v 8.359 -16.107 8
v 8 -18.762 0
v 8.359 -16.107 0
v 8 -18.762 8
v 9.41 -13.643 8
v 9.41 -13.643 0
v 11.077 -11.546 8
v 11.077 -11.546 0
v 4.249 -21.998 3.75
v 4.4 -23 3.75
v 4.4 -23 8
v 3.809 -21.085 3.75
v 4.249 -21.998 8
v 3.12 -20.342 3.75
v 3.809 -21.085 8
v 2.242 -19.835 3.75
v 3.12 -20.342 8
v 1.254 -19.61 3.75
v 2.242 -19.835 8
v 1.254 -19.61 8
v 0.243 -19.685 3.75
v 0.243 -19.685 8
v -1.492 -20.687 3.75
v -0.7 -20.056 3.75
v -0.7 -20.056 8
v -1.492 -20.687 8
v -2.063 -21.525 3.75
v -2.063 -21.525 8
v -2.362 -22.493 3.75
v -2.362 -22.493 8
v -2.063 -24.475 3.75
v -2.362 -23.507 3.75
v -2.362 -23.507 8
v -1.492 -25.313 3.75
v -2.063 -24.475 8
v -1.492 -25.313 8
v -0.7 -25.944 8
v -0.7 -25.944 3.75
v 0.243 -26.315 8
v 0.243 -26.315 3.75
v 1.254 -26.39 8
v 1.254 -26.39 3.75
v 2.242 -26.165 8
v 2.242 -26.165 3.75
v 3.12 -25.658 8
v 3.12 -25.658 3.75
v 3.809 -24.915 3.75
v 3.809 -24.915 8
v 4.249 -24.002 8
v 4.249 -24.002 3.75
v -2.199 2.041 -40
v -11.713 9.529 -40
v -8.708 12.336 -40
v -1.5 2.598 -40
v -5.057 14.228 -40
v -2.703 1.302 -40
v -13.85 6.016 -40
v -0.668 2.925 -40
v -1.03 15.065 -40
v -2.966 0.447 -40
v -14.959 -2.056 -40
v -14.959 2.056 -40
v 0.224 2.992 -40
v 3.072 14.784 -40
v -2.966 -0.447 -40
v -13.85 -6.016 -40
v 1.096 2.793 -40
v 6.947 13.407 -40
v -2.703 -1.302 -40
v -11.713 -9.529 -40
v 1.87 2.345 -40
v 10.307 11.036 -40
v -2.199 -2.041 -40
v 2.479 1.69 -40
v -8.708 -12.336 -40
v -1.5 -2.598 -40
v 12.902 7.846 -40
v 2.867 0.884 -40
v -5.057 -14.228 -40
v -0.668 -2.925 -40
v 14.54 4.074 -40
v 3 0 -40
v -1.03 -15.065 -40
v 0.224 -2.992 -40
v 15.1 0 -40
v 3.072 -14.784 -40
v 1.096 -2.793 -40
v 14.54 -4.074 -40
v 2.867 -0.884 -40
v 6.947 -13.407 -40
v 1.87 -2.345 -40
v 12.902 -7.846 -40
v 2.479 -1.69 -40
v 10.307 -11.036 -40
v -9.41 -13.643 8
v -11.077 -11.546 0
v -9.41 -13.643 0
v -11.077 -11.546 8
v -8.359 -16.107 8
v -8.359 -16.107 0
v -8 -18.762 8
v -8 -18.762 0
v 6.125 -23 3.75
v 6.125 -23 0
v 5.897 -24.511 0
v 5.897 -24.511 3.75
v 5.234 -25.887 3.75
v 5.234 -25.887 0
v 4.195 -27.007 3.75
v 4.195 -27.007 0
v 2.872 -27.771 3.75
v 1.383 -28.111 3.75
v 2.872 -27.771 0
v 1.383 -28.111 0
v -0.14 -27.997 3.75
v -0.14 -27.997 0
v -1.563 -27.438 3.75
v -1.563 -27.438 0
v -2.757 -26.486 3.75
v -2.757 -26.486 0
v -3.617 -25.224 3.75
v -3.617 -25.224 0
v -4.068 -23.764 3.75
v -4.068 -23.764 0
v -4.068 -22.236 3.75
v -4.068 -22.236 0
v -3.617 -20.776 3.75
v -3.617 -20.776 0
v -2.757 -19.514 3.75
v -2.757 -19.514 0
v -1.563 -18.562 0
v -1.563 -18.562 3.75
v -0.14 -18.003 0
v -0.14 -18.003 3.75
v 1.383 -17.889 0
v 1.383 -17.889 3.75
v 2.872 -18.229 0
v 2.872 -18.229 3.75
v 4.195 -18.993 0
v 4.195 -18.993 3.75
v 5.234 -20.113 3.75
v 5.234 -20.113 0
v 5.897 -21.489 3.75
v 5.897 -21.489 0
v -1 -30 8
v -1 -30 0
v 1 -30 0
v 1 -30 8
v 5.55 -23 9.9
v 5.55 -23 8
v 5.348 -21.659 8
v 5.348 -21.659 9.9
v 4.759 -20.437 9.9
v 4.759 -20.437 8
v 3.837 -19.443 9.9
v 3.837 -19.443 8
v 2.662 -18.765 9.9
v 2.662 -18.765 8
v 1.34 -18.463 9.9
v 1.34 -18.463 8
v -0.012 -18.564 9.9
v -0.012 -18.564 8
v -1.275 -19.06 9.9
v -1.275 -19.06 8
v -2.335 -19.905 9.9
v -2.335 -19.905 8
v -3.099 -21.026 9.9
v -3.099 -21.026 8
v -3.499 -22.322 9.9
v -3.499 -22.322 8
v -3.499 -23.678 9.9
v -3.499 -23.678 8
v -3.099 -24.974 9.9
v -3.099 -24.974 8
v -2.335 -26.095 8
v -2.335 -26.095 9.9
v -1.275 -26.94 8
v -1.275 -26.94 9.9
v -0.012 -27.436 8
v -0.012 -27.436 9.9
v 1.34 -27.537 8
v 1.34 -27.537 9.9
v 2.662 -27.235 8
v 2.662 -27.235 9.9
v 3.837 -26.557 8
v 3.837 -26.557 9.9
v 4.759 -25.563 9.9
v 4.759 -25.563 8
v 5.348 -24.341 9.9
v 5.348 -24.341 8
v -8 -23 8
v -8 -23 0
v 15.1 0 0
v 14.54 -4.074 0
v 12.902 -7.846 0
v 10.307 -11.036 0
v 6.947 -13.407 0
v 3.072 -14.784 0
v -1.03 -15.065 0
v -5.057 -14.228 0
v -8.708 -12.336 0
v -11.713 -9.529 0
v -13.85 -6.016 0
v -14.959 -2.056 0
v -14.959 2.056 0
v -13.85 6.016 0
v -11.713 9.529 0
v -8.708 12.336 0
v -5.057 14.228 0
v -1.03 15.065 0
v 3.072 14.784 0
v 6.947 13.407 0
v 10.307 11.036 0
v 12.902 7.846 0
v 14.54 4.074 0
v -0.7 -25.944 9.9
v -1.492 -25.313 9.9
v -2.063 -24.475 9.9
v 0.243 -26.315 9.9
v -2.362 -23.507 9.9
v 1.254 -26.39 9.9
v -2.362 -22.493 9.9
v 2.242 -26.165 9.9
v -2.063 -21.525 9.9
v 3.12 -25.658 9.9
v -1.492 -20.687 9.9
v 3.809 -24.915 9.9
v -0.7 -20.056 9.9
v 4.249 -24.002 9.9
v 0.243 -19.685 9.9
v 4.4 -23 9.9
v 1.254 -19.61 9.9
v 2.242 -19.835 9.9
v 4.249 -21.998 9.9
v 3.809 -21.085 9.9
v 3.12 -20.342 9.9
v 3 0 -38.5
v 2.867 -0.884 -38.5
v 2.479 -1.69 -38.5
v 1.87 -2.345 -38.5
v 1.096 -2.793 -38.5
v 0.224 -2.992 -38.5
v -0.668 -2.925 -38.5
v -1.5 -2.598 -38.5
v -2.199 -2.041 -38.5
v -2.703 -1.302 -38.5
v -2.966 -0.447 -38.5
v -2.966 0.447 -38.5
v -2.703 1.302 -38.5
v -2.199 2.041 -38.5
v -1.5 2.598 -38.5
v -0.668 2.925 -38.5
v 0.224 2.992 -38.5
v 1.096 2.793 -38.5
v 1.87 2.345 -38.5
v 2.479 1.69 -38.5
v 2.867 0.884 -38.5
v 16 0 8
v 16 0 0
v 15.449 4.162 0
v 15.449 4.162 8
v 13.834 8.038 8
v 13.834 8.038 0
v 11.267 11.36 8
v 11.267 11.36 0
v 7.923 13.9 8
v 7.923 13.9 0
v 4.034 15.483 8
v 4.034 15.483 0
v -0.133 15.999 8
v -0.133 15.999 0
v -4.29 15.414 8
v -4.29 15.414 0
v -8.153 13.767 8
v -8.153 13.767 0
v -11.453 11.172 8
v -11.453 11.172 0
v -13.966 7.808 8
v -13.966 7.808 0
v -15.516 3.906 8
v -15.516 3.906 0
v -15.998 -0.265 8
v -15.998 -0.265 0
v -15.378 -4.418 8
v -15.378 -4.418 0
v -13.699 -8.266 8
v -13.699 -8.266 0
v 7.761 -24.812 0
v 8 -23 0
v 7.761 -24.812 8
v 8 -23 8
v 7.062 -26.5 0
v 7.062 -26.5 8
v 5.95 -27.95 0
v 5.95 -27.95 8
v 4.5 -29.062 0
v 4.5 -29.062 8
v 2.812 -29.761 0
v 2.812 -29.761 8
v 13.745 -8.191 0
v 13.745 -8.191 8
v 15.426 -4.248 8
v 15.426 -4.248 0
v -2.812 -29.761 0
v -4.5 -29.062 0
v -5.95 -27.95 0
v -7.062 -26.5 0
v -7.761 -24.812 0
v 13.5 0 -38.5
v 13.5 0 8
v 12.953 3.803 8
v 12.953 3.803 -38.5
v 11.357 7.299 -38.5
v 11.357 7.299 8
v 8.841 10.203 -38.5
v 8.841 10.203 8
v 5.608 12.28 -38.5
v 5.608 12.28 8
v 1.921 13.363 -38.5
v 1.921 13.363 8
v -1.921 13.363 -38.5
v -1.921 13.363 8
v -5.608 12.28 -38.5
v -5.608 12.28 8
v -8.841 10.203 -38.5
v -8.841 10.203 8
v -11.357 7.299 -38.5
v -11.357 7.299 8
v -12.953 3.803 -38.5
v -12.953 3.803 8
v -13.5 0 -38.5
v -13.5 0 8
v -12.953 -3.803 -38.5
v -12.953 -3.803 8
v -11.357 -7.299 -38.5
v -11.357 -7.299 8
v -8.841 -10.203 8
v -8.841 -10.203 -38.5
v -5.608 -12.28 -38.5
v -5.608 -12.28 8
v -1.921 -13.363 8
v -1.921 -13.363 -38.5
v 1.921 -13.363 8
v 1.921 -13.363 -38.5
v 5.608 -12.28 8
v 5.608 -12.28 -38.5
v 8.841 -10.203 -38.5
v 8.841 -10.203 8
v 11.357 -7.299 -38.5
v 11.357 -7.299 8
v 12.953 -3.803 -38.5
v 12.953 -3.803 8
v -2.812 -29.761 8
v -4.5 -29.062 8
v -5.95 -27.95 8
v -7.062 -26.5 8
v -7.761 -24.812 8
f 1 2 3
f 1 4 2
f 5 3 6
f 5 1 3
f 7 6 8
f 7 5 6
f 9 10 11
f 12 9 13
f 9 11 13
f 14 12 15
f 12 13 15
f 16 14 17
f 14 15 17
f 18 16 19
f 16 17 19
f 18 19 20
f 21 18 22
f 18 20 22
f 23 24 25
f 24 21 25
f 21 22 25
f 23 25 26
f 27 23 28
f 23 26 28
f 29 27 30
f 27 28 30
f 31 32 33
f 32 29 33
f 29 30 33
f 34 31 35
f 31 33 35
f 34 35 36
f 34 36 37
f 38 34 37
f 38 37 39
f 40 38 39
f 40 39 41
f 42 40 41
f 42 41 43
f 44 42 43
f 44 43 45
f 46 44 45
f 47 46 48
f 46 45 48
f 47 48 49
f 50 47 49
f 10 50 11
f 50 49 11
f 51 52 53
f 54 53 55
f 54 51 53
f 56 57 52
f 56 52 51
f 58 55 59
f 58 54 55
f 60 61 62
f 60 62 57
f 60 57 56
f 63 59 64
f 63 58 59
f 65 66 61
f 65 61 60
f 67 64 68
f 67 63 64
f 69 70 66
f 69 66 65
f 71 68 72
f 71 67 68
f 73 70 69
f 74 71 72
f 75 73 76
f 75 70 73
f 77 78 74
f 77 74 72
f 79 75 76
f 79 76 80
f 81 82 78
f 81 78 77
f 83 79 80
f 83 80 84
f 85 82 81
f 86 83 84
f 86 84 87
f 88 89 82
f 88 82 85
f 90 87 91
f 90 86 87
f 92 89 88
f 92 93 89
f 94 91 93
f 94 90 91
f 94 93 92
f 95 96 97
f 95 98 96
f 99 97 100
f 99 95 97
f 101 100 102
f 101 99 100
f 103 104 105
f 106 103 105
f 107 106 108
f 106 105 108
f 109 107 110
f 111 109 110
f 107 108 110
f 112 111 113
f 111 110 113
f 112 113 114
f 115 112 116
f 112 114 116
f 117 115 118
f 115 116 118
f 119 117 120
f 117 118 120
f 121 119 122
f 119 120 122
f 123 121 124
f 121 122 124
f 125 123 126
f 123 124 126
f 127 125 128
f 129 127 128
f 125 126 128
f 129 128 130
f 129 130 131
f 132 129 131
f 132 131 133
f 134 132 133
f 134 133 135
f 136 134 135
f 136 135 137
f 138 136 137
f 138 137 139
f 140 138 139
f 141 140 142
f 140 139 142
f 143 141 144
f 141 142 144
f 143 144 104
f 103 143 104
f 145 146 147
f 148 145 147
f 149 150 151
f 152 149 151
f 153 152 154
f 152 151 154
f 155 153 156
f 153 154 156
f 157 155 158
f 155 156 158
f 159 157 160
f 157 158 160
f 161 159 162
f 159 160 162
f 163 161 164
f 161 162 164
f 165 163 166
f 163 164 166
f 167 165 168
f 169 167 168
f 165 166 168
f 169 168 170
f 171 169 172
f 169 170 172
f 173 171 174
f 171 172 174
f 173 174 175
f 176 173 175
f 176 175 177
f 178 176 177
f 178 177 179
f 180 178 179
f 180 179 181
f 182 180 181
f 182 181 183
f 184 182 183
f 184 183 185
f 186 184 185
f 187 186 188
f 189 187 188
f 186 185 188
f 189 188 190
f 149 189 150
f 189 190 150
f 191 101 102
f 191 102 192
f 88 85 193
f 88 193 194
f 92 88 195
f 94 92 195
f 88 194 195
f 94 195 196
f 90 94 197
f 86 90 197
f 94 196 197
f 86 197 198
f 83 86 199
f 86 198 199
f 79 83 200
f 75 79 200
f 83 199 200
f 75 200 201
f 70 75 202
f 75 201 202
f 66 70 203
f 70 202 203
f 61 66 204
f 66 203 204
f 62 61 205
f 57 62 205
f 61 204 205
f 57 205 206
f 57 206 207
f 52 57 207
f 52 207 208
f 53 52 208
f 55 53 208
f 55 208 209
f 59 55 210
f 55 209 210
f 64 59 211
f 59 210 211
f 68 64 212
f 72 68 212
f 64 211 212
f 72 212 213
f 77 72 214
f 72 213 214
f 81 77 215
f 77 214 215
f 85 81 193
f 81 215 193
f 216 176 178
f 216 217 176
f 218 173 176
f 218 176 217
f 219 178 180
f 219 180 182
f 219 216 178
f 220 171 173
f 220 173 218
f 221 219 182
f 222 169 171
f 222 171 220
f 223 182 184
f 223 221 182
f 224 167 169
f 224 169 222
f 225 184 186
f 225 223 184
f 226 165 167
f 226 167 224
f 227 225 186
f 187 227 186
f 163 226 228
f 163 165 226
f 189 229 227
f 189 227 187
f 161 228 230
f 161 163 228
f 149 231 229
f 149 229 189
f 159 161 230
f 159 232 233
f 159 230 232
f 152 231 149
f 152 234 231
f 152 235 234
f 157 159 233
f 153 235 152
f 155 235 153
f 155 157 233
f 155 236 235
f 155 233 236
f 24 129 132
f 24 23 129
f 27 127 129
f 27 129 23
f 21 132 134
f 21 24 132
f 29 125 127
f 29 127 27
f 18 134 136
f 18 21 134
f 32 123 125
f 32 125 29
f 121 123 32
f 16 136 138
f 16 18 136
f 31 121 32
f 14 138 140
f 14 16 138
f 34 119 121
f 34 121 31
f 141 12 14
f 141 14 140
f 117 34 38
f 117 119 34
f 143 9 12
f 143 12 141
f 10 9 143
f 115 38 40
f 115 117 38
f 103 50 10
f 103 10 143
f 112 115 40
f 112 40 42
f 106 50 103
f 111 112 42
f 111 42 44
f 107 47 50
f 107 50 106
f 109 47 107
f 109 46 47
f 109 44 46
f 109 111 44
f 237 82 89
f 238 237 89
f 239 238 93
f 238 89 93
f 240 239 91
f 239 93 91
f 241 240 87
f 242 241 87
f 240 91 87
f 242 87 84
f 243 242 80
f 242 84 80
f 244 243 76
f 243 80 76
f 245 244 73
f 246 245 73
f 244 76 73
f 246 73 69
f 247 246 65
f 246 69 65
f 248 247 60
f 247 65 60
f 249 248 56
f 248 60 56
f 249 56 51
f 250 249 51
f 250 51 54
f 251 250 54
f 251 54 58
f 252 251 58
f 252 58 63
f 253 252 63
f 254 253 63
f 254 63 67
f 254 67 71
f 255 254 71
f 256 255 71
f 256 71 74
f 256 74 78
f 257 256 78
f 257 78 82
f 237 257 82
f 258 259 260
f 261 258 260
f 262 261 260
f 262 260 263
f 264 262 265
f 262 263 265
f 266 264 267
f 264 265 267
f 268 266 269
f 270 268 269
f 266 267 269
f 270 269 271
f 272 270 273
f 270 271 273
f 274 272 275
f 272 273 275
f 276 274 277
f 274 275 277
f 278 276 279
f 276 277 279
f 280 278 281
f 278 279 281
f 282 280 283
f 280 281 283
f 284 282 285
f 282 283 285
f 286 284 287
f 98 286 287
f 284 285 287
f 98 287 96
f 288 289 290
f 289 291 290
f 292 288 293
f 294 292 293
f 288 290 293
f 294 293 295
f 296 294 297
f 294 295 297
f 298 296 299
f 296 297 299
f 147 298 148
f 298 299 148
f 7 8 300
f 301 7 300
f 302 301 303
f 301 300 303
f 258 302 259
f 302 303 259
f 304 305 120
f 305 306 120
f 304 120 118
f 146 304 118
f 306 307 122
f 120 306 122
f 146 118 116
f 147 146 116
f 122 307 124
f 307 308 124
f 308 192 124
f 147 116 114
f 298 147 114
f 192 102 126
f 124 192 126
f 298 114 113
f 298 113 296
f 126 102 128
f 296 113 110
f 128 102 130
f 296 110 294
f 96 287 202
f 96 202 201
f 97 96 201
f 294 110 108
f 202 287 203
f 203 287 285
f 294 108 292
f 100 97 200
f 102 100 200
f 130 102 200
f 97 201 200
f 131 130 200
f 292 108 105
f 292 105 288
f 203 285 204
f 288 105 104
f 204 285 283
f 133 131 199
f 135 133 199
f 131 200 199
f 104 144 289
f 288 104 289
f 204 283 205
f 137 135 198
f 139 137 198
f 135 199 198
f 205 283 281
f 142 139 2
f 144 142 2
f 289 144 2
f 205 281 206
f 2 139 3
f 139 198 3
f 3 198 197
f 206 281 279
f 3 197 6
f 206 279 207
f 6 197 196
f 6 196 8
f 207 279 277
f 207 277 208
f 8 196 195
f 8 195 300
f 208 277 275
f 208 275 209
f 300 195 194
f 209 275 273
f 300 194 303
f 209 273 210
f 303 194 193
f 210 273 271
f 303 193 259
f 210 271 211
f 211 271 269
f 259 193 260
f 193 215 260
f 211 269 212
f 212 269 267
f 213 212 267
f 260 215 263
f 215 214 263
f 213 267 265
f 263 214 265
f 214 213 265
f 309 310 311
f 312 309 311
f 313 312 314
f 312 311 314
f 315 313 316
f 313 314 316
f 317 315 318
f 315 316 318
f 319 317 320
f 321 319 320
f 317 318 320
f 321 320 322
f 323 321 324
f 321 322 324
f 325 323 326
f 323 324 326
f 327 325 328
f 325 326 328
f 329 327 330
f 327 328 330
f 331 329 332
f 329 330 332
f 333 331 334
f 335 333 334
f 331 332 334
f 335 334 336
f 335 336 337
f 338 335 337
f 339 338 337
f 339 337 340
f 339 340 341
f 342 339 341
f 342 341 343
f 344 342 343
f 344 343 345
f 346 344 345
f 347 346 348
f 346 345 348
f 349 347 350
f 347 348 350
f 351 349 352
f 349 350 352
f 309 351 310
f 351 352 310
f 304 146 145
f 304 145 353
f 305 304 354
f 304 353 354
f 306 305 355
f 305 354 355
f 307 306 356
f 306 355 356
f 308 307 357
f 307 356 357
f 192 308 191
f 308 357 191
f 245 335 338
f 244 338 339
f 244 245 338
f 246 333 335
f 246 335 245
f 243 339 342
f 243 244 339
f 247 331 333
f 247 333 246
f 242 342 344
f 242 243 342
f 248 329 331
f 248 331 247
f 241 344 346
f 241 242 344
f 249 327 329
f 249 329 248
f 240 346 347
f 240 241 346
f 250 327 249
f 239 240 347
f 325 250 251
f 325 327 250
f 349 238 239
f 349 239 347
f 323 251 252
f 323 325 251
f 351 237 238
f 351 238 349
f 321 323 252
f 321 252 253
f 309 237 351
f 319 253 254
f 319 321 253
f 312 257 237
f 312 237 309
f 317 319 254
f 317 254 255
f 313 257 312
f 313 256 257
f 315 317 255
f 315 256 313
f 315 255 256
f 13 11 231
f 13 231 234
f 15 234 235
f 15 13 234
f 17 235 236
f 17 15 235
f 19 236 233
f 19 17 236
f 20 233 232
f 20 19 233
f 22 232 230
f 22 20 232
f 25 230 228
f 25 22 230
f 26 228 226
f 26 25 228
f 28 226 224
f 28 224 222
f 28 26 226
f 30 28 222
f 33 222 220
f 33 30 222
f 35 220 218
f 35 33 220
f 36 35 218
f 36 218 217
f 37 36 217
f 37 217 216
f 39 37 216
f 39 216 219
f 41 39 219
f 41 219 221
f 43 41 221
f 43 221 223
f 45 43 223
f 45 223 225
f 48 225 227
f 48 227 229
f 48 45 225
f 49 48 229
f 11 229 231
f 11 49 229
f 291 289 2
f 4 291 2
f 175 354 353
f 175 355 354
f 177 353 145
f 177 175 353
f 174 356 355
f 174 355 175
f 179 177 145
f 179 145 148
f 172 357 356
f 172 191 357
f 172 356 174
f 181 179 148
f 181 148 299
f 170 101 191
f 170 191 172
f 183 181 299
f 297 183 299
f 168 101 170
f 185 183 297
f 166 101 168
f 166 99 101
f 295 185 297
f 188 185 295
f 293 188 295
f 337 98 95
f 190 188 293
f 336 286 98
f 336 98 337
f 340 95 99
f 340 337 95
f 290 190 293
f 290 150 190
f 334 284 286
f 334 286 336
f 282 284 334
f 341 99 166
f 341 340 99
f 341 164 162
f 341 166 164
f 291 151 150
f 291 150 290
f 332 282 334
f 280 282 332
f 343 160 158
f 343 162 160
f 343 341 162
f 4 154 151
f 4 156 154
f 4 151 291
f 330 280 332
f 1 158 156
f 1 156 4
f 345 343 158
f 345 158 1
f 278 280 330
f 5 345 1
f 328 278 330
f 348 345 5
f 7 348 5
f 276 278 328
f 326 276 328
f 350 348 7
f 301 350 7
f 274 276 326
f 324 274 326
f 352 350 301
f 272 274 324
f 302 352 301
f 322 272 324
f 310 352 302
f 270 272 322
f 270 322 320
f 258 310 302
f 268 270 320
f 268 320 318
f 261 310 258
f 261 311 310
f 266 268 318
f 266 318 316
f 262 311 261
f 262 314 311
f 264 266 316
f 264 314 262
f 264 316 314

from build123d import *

# Parameters (mm, degrees)
F1_DEPTH  = 8
F2_R      = 15.1
F3_DEPTH  = 40
F4_R      = 7
F5_R      = 13.5
F6_DEPTH  = 46.5
F7_R      = 4.55
F7_R_2    = 3.4
F8_DEPTH  = 1.9
F9_DEPTH  = 48.001
F10_R     = 5.125
F10_R_2   = 3.4
F11_DEPTH = 3.75
F12_R     = 3
F13_DEPTH = 49.901
F14_R     = 10


with BuildPart() as f1:
    # F0 (on Top) → F1 (new body)
    with BuildSketch(Plane.XY):
        with BuildLine():
            ThreePointArc((8, -13.8564064606), (13.8564064606, -8), (16, 0))
            ThreePointArc((16, 0), (-8, 13.8564064606), (-8, -13.8564064606))
            Line((-8, -13.8564064606), (-8, 0))
            Line((-8, 0), (8, 0))
            Line((8, 0), (8, -13.8564064606))
        make_face()
        with BuildLine():
            Line((-8, 0), (-8, -13.8564064606))
            ThreePointArc((-8, -13.8564064606), (0, -16), (8, -13.8564064606))
            Line((8, -13.8564064606), (8, 0))
            Line((8, 0), (-8, 0))
        make_face()
        with BuildLine():
            ThreePointArc((8, -13.8564064606), (0, -16), (-8, -13.8564064606))
            Line((-8, -13.8564064606), (-8, -30))
            Line((-8, -30), (8, -30))
            Line((8, -30), (8, -13.8564064606))
        make_face()
    extrude(amount=F1_DEPTH)

    # F2 (on face) → F3 (join)
    with BuildSketch(Plane(origin=(0, 0, 0), x_dir=(1, 0, 0), z_dir=(0, 0, -1))):
        Circle(F2_R)
    extrude(amount=F3_DEPTH)

    # F4
    f4_edges = [f1.edges().sort_by_distance(p)[0] for p in [
        (-8, -30, 4),
        (8, -30, 4),
    ]]
    fillet(f4_edges, radius=F4_R)

    # F5 (on face) → F6 (cut)
    with BuildSketch(Plane.XY.offset(8)):
        Circle(F5_R)
    extrude(amount=-F6_DEPTH, mode=Mode.SUBTRACT)

    # F7 (on face) → F8 (join)
    with BuildSketch(Plane.XY.offset(8)):
        with Locations((1, -23)):
            Circle(F7_R)
        with Locations((1, -23)):
            Circle(F7_R_2, mode=Mode.SUBTRACT)
    extrude(amount=F8_DEPTH)

    # F9 (cut, through all): a face of the model
    f9_faces = [f1.faces().sort_by_distance(p)[0] for p in [
        (1, -23, 8),
    ]]
    extrude(f9_faces, amount=-F9_DEPTH, mode=Mode.SUBTRACT)

    # F10 (on face) → F11 (cut)
    with BuildSketch(Plane(origin=(0, 0, 0), x_dir=(1, 0, 0), z_dir=(0, 0, -1))):
        with Locations((1, 23)):
            Circle(F10_R)
        with Locations((1, 23)):
            Circle(F10_R_2, mode=Mode.SUBTRACT)
    extrude(amount=-F11_DEPTH, mode=Mode.SUBTRACT)

    # F12 (on face) → F13 (cut, through all)
    with BuildSketch(Plane(origin=(0, 0, -40), x_dir=(1, 0, 0), z_dir=(0, 0, -1))):
        Circle(F12_R)
    extrude(amount=-F13_DEPTH, mode=Mode.SUBTRACT)

    # F14
    f14_edges = [f1.edges().sort_by_distance(p)[0] for p in [
        (-8, -13.856406, 4),
        (8, -13.856406, 4),
    ]]
    fillet(f14_edges, radius=F14_R)


solid = f1.part
